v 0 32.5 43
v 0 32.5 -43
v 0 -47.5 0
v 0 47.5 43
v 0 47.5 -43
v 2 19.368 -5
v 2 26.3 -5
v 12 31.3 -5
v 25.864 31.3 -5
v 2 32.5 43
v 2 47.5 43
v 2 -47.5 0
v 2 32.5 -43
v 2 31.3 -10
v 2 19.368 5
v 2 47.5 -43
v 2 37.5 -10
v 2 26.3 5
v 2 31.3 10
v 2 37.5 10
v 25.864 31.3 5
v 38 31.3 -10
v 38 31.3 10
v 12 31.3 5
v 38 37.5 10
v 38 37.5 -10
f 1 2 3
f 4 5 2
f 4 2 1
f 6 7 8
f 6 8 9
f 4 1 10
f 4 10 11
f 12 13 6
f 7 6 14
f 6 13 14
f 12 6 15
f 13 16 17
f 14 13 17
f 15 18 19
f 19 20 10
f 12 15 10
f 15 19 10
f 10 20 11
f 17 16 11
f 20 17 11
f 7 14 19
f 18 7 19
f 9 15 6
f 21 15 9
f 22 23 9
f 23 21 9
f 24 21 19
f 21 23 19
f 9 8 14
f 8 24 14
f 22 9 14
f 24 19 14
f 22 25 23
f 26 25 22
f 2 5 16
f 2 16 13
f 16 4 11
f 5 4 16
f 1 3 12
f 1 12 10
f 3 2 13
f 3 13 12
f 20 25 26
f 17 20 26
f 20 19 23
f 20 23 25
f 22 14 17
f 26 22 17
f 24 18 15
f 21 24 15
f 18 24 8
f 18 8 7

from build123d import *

# Parameters (mm, degrees)
BOSS_EXTRUDE1_DEPTH = 2
SKETCH2_W           = 20
SKETCH2_H           = 6.2
BOSS_EXTRUDE2_DEPTH = 36
BOSS_EXTRUDE3_DEPTH = 5


with BuildPart() as part:
    # Sketch1 → Boss-Extrude1 (new body)
    with BuildSketch(Plane(origin=(0, 0, 0), x_dir=(0, 0, -1), z_dir=(1, 0, 0))):
        Polygon((-43, 47.5), (43, 47.5), (43, 32.5), (0, -47.5), (-43, 32.5), align=None)
    extrude(amount=BOSS_EXTRUDE1_DEPTH)

    # Sketch2 → Boss-Extrude2 (add)
    with BuildSketch(Plane(origin=(2, 0, 0), x_dir=(0, 0, -1), z_dir=(1, 0, 0))):
        with Locations((0, 34.4)):
            Rectangle(SKETCH2_W, SKETCH2_H)
    extrude(amount=BOSS_EXTRUDE2_DEPTH)

    # Sketch3 → Boss-Extrude3 (add, symmetric)
    with BuildSketch(Plane.XY):
        Polygon((2, 19.36818927), (25.86362146, 31.3), (12, 31.3), (2, 26.3), align=None)
    extrude(amount=BOSS_EXTRUDE3_DEPTH, both=True)


solid = part.part
